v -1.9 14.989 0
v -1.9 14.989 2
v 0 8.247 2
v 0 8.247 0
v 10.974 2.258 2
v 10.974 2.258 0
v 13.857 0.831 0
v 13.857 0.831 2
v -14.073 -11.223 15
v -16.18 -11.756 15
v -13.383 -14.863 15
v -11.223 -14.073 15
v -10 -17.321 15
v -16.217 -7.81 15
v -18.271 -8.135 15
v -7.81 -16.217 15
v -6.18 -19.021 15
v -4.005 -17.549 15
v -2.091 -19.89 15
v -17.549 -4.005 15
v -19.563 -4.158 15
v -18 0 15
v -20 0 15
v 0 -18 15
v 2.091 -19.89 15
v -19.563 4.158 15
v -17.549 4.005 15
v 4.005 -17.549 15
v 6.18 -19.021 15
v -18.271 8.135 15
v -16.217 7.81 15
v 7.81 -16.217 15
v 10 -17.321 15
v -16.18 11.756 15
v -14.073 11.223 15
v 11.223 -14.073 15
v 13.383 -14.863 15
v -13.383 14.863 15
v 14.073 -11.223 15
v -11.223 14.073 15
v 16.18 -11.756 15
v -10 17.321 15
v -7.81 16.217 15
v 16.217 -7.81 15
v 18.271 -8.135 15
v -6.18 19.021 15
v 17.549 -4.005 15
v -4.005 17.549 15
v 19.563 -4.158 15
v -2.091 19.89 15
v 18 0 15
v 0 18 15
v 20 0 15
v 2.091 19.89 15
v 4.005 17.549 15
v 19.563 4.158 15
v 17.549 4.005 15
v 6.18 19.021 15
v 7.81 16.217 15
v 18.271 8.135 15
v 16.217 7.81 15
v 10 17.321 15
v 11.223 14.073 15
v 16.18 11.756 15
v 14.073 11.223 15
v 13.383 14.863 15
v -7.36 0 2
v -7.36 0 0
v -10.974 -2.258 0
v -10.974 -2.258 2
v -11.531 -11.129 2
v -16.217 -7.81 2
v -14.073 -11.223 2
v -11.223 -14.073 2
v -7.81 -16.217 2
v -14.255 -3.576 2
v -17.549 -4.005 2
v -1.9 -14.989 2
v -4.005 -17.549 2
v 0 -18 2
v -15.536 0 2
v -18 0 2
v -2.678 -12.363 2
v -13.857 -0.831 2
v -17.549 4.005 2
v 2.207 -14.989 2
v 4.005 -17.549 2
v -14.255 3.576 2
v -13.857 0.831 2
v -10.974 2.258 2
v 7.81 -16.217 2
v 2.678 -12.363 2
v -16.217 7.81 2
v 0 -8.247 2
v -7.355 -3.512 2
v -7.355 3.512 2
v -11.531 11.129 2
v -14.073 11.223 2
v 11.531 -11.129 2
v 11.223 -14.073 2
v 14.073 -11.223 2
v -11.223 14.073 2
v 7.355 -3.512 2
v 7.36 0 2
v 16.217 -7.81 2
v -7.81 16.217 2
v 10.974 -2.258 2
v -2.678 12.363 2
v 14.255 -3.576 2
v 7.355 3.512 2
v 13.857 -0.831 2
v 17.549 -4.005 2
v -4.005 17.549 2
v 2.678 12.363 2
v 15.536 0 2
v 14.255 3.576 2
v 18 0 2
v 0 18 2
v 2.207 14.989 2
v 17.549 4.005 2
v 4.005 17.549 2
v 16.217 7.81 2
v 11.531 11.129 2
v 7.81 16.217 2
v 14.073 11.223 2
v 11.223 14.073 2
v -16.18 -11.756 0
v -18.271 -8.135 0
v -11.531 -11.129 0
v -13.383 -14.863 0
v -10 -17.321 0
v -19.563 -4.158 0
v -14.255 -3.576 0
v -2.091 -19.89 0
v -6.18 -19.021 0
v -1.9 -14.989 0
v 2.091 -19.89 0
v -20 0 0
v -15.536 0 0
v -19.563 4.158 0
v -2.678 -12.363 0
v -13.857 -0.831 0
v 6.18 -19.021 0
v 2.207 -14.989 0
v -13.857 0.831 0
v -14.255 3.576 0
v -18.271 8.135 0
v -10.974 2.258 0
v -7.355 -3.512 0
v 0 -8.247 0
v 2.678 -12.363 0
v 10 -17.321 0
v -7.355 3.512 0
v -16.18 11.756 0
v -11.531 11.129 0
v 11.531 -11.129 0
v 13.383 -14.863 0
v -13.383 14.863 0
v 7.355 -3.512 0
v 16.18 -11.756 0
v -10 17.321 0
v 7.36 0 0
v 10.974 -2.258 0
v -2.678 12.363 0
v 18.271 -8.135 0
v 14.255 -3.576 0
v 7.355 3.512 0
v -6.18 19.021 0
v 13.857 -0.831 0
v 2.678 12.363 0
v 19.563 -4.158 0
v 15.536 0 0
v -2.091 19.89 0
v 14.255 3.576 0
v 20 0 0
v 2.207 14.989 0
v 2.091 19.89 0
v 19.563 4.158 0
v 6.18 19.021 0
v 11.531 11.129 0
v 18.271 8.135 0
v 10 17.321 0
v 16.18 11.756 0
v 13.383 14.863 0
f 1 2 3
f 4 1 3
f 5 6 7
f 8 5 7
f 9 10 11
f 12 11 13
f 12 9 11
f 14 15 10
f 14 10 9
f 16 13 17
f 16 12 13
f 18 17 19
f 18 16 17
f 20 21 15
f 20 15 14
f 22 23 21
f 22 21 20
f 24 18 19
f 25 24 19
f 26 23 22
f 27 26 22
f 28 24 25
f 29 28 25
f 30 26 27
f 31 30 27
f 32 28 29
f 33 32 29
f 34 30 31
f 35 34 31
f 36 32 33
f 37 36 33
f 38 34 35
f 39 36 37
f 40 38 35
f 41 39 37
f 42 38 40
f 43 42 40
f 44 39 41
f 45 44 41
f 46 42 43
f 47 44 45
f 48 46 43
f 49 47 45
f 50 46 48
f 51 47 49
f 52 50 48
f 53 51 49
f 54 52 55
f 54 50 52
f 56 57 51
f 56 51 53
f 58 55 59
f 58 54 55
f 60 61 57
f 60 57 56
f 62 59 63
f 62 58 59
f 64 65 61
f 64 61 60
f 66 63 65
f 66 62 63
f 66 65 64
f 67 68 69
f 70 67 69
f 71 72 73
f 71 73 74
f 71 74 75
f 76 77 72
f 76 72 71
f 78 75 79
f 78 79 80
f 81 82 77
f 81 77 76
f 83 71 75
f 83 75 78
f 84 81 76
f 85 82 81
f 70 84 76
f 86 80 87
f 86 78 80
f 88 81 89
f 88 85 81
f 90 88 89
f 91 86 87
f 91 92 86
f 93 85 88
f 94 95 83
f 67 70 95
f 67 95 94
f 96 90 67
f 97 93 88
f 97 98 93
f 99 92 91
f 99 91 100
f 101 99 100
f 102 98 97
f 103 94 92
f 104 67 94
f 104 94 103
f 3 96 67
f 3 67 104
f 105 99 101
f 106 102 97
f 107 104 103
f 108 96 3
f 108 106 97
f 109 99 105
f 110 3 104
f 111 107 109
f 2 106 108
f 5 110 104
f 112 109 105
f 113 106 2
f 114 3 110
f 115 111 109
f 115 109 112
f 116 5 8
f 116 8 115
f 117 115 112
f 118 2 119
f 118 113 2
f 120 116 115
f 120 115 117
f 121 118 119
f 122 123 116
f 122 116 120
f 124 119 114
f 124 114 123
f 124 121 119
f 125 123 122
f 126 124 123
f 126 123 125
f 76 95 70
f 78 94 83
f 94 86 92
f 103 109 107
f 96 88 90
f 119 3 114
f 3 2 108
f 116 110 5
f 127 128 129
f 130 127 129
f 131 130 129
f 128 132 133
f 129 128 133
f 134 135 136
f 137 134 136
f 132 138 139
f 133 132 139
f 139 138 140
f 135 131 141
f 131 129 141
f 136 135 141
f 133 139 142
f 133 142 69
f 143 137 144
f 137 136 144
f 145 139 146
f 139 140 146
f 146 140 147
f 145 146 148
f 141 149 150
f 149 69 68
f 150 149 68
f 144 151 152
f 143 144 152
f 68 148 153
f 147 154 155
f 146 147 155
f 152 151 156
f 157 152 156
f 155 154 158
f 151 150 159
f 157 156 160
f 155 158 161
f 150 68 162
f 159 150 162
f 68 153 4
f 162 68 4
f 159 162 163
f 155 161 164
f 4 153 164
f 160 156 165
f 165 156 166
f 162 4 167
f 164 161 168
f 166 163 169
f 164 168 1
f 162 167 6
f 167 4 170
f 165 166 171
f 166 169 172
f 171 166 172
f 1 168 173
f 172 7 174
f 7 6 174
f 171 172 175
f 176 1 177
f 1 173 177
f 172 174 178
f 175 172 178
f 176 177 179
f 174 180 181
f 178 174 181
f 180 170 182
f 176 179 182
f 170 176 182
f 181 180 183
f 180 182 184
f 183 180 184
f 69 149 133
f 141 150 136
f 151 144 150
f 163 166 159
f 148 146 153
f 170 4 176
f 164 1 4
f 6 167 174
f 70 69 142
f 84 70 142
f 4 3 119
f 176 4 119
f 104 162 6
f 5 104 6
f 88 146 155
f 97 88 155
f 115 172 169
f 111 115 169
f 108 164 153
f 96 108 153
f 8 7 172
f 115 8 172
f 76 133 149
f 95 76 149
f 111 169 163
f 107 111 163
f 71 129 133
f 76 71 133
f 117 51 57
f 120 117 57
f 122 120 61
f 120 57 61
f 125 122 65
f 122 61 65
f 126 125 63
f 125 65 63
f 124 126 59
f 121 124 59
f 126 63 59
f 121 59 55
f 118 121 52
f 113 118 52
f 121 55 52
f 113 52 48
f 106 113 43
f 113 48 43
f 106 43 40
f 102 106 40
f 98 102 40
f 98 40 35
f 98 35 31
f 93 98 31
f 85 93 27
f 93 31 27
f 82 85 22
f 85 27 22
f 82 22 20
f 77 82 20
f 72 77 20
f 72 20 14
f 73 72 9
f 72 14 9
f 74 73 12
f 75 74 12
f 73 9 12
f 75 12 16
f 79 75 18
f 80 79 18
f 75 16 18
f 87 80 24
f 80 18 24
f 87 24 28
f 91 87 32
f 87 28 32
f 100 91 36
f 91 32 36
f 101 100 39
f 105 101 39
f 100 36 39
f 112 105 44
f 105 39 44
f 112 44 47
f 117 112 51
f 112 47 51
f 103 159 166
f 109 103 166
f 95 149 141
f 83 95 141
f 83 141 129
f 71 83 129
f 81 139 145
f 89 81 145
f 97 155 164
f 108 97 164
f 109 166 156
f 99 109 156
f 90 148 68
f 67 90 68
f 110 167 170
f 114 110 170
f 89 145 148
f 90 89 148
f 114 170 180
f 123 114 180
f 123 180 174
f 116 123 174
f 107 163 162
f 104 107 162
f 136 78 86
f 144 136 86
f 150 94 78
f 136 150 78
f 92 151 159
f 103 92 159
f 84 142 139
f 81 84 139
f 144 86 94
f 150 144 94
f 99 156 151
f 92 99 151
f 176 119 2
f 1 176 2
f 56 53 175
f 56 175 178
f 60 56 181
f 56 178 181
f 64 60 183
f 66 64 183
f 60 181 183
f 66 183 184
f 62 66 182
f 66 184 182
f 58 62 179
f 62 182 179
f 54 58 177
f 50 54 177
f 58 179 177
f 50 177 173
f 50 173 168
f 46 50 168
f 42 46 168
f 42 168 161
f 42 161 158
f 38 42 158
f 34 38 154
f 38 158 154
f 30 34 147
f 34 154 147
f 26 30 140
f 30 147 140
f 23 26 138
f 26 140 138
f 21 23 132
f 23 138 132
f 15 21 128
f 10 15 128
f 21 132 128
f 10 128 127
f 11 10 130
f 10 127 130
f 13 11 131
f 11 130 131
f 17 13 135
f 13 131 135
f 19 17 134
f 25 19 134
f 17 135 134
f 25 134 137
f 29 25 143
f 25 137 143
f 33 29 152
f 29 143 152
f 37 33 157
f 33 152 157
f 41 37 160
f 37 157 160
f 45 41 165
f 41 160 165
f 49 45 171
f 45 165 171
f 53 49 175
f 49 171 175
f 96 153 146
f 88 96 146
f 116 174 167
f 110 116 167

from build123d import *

# Parameters (mm, degrees)
F0_R      = 20
F1_DEPTH  = 15
F2_R      = 18
F3_DEPTH  = 13
F9_DEPTH  = 8.7
F11_DEPTH = 11
F13_DEPTH = 22.4
F14_DEPTH = 4.9


# Not quite as in the source:
# - the program builds the solid bodies; features that only make, move or delete a surface that nothing else refers to are left out


with BuildPart() as f1:
    # F0 (on Top) → F1 (new body)
    with BuildSketch(Plane.XY):
        Circle(F0_R)
    extrude(amount=F1_DEPTH)

    # F2 (on face) → F3 (cut)
    with BuildSketch(Plane.XY.offset(15)):
        Circle(F2_R)
    extrude(amount=-F3_DEPTH, mode=Mode.SUBTRACT)

    # F8 (on face) → F9 (cut)
    with BuildSketch(Plane(origin=(0, 0, 0), x_dir=(1, 0, 0), z_dir=(0, 0, -1))):
        Polygon((-11.5306517109, 11.1294062808), (-14.2554212362, 3.5755613353), (-7.3548774235, 3.5121154506), (-2.6781838387, 12.3627316207), align=None)
        Polygon((7.3548774235, 3.5121154506), (14.2554212362, 3.5755613353), (11.5306517109, 11.1294062808), (2.6781838387, 12.3627316207), align=None)
        Polygon((11.5306517109, -11.1294062808), (14.2554212362, -3.5755613353), (7.3548774235, -3.5121154506), (2.6781838387, -12.3627316207), align=None)
        Polygon((-14.2554212362, -3.5755613353), (-11.5306517109, -11.1294062808), (-2.6781838387, -12.3627316207), (-7.3548774235, -3.5121154506), align=None)
    extrude(amount=-F9_DEPTH, mode=Mode.SUBTRACT)

    # F10 (on face) → F11 (cut)
    with BuildSketch(Plane(origin=(0, 0, 0), x_dir=(1, 0, 0), z_dir=(0, 0, -1))):
        Polygon((15.5360468029, 0), (13.8570014387, 0.8311709389), (10.9741548076, 2.2582546808), (7.3600309273, 0), (10.9741548076, -2.2582546808), (13.8570014387, -0.8311709389), align=None)
        Polygon((-10.9741548076, -2.2582546808), (-7.3600309273, 0), (-10.9741548076, 2.2582546808), (-13.8570014387, 0.8311709389), (-15.5360468029, 0), (-13.8570014387, -0.8311709389), align=None)
    extrude(amount=-F11_DEPTH, mode=Mode.SUBTRACT)

    # F12 (on face) → F13 (cut)
    with BuildSketch(Plane.XY.offset(2)):
        Polygon((2.2074584849, 14.9893220514), (-1.9000733737, 14.9893220514), (0, 8.2467701286), align=None)
        Polygon((-1.9000733737, -14.9893220514), (2.2074584849, -14.9893220514), (0, -8.2467701286), align=None)
    extrude(amount=F13_DEPTH, mode=Mode.SUBTRACT)

    # F12 (on face) → F14 (cut)
    with BuildSketch(Plane.XY.offset(2)):
        Polygon((2.2074584849, 14.9893220514), (-1.9000733737, 14.9893220514), (0, 8.2467701286), align=None)
        Polygon((-1.9000733737, -14.9893220514), (2.2074584849, -14.9893220514), (0, -8.2467701286), align=None)
    extrude(amount=-F14_DEPTH, mode=Mode.SUBTRACT)


solid = f1.part
